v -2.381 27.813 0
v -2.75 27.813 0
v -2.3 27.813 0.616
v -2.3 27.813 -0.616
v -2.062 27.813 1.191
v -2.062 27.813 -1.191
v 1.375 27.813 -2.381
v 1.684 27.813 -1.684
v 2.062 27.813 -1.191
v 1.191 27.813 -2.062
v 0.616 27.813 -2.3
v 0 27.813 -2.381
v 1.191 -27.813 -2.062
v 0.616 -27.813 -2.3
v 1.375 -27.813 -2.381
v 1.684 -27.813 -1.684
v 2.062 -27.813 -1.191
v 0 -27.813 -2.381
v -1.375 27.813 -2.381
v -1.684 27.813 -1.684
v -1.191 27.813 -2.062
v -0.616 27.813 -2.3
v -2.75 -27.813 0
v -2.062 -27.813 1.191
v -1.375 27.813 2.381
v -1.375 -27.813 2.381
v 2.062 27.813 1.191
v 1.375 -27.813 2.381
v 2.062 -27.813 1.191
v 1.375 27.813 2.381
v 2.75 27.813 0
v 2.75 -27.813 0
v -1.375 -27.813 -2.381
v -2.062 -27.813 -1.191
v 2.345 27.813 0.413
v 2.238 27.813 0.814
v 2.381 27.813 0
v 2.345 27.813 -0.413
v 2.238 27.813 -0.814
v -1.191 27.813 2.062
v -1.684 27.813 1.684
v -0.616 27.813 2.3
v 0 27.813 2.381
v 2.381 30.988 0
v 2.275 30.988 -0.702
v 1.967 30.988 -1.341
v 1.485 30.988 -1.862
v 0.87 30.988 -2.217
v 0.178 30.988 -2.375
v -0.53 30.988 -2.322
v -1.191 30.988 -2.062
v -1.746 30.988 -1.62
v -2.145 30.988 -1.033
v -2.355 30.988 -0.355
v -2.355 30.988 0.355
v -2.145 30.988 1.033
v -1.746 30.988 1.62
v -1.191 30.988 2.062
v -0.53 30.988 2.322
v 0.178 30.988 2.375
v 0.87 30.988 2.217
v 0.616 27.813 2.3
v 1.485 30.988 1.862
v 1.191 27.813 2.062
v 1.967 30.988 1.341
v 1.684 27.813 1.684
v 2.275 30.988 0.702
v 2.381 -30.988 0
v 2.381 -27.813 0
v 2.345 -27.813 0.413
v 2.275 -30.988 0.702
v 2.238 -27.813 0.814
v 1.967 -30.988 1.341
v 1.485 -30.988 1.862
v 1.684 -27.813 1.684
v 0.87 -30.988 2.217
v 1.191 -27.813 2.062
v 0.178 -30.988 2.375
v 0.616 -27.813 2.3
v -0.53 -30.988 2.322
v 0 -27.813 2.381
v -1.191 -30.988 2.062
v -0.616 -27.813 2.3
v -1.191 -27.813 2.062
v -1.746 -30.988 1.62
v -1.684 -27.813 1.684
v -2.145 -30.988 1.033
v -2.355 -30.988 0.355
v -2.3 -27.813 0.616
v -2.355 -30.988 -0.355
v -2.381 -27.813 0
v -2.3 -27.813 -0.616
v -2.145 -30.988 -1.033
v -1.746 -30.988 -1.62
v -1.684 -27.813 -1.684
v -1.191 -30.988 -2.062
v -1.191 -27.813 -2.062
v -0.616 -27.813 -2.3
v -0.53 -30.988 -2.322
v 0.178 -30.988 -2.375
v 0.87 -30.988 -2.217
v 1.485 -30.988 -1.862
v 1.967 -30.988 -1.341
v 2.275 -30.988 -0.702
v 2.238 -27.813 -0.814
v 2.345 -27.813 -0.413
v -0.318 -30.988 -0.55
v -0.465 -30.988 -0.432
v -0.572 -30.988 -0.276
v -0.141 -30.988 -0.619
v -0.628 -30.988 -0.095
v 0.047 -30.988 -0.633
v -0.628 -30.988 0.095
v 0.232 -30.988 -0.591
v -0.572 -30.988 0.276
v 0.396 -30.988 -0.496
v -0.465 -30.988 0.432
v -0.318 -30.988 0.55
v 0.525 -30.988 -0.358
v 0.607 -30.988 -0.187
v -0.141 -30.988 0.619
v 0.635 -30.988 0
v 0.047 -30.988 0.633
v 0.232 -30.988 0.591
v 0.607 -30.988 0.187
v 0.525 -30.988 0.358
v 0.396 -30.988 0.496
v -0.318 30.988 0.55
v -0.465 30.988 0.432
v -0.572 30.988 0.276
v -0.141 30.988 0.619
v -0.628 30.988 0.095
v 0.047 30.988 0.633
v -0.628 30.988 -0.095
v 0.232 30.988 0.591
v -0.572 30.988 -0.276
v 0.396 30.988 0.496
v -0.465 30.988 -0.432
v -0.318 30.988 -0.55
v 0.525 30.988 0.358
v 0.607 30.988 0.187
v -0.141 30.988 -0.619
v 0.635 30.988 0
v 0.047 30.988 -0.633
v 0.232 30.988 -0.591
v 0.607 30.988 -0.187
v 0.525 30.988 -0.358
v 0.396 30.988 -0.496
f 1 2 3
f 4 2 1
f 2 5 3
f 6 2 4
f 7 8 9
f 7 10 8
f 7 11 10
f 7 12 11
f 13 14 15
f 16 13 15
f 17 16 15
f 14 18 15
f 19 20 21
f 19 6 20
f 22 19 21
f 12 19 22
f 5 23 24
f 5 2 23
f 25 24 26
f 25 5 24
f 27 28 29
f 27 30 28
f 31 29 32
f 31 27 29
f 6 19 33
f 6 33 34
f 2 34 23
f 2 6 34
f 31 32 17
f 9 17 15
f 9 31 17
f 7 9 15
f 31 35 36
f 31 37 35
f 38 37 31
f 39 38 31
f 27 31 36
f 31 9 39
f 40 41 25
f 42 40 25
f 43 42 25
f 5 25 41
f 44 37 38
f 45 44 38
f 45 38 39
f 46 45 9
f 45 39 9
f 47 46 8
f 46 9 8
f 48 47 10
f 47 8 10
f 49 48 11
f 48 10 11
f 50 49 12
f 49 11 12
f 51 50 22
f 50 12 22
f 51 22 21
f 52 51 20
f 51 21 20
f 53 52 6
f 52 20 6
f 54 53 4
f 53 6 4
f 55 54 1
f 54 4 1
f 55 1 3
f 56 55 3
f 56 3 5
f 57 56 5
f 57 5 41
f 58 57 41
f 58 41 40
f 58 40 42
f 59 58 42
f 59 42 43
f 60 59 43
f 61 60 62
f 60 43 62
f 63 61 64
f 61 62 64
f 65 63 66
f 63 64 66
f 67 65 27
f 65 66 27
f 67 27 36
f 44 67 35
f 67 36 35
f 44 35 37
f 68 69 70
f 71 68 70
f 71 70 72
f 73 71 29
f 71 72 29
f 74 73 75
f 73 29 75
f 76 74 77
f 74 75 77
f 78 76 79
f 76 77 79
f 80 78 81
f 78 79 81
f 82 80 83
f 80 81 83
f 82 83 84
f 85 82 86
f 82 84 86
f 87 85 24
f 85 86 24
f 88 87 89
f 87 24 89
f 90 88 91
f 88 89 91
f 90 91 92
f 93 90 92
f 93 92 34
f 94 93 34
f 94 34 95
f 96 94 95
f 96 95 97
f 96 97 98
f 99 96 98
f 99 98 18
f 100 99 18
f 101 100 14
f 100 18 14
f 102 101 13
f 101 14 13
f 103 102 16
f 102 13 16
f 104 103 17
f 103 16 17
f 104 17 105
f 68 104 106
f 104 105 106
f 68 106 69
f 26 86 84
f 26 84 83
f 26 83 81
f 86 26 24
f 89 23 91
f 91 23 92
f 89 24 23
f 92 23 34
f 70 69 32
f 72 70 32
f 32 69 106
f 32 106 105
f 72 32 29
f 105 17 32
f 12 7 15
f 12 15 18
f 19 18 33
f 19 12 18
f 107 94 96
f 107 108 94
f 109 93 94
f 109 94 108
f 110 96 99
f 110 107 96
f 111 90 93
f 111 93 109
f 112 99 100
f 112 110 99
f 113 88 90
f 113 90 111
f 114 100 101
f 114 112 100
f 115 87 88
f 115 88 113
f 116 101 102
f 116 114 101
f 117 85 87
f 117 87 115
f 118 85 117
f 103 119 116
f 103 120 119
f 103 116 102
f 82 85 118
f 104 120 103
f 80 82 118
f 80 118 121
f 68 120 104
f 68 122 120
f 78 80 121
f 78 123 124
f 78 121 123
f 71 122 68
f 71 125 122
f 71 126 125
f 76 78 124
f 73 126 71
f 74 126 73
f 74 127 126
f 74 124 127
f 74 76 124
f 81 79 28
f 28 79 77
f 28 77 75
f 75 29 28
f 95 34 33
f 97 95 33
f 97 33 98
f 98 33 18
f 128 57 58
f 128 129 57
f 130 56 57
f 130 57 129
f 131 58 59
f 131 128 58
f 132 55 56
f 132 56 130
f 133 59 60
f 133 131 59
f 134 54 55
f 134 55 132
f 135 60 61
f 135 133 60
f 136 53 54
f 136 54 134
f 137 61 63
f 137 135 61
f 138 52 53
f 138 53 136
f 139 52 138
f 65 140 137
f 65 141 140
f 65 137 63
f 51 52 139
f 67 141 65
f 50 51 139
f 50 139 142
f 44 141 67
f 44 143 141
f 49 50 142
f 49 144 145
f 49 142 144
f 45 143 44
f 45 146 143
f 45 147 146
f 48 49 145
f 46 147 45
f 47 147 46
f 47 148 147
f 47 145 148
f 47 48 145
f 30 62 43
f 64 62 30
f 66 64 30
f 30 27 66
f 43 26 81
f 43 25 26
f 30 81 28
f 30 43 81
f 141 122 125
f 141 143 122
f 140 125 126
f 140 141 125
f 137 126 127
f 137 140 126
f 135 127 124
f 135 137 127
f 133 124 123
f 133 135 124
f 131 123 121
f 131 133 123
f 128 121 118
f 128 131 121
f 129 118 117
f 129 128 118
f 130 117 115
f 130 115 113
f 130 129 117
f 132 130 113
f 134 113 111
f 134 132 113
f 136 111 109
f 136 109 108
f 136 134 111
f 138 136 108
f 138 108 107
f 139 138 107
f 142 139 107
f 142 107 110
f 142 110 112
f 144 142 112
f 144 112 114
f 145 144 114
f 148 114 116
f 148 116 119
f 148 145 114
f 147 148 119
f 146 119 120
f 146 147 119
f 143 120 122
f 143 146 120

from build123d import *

# Parameters (mm, degrees)
SKETCH1_R           = 0.635
BOSS_EXTRUDE1_DEPTH = 27.813
SKETCH2_R           = 2.38125
SKETCH2_R_2         = 0.635
BOSS_EXTRUDE2_DEPTH = 3.175
SKETCH3_R           = 2.38125
SKETCH3_R_2         = 0.635
BOSS_EXTRUDE3_DEPTH = 3.175


with BuildPart() as part:
    # Sketch1 → Boss-Extrude1 (new body, symmetric)
    with BuildSketch(Plane(origin=(0, 0, 0), x_dir=(1, 0, 0), z_dir=(0, 1, 0))):
        Polygon((1.374815329, -2.38125), (2.749630657, 0), (1.374815329, 2.38125), (-1.374815329, 2.38125), (-2.749630657, 0), (-1.374815329, -2.38125), align=None)
        Circle(SKETCH1_R, mode=Mode.SUBTRACT)
    extrude(amount=BOSS_EXTRUDE1_DEPTH, both=True)

    # Sketch2 → Boss-Extrude2 (add)
    with BuildSketch(Plane(origin=(0, 27.813, 0), x_dir=(1, 0, 0), z_dir=(0, 1, 0))):
        Circle(SKETCH2_R)
        Circle(SKETCH2_R_2, mode=Mode.SUBTRACT)
    extrude(amount=BOSS_EXTRUDE2_DEPTH)

    # Sketch3 → Boss-Extrude3 (add)
    with BuildSketch(Plane.XZ.offset(27.813)):
        Circle(SKETCH3_R)
        Circle(SKETCH3_R_2, mode=Mode.SUBTRACT)
    extrude(amount=BOSS_EXTRUDE3_DEPTH)


solid = part.part
